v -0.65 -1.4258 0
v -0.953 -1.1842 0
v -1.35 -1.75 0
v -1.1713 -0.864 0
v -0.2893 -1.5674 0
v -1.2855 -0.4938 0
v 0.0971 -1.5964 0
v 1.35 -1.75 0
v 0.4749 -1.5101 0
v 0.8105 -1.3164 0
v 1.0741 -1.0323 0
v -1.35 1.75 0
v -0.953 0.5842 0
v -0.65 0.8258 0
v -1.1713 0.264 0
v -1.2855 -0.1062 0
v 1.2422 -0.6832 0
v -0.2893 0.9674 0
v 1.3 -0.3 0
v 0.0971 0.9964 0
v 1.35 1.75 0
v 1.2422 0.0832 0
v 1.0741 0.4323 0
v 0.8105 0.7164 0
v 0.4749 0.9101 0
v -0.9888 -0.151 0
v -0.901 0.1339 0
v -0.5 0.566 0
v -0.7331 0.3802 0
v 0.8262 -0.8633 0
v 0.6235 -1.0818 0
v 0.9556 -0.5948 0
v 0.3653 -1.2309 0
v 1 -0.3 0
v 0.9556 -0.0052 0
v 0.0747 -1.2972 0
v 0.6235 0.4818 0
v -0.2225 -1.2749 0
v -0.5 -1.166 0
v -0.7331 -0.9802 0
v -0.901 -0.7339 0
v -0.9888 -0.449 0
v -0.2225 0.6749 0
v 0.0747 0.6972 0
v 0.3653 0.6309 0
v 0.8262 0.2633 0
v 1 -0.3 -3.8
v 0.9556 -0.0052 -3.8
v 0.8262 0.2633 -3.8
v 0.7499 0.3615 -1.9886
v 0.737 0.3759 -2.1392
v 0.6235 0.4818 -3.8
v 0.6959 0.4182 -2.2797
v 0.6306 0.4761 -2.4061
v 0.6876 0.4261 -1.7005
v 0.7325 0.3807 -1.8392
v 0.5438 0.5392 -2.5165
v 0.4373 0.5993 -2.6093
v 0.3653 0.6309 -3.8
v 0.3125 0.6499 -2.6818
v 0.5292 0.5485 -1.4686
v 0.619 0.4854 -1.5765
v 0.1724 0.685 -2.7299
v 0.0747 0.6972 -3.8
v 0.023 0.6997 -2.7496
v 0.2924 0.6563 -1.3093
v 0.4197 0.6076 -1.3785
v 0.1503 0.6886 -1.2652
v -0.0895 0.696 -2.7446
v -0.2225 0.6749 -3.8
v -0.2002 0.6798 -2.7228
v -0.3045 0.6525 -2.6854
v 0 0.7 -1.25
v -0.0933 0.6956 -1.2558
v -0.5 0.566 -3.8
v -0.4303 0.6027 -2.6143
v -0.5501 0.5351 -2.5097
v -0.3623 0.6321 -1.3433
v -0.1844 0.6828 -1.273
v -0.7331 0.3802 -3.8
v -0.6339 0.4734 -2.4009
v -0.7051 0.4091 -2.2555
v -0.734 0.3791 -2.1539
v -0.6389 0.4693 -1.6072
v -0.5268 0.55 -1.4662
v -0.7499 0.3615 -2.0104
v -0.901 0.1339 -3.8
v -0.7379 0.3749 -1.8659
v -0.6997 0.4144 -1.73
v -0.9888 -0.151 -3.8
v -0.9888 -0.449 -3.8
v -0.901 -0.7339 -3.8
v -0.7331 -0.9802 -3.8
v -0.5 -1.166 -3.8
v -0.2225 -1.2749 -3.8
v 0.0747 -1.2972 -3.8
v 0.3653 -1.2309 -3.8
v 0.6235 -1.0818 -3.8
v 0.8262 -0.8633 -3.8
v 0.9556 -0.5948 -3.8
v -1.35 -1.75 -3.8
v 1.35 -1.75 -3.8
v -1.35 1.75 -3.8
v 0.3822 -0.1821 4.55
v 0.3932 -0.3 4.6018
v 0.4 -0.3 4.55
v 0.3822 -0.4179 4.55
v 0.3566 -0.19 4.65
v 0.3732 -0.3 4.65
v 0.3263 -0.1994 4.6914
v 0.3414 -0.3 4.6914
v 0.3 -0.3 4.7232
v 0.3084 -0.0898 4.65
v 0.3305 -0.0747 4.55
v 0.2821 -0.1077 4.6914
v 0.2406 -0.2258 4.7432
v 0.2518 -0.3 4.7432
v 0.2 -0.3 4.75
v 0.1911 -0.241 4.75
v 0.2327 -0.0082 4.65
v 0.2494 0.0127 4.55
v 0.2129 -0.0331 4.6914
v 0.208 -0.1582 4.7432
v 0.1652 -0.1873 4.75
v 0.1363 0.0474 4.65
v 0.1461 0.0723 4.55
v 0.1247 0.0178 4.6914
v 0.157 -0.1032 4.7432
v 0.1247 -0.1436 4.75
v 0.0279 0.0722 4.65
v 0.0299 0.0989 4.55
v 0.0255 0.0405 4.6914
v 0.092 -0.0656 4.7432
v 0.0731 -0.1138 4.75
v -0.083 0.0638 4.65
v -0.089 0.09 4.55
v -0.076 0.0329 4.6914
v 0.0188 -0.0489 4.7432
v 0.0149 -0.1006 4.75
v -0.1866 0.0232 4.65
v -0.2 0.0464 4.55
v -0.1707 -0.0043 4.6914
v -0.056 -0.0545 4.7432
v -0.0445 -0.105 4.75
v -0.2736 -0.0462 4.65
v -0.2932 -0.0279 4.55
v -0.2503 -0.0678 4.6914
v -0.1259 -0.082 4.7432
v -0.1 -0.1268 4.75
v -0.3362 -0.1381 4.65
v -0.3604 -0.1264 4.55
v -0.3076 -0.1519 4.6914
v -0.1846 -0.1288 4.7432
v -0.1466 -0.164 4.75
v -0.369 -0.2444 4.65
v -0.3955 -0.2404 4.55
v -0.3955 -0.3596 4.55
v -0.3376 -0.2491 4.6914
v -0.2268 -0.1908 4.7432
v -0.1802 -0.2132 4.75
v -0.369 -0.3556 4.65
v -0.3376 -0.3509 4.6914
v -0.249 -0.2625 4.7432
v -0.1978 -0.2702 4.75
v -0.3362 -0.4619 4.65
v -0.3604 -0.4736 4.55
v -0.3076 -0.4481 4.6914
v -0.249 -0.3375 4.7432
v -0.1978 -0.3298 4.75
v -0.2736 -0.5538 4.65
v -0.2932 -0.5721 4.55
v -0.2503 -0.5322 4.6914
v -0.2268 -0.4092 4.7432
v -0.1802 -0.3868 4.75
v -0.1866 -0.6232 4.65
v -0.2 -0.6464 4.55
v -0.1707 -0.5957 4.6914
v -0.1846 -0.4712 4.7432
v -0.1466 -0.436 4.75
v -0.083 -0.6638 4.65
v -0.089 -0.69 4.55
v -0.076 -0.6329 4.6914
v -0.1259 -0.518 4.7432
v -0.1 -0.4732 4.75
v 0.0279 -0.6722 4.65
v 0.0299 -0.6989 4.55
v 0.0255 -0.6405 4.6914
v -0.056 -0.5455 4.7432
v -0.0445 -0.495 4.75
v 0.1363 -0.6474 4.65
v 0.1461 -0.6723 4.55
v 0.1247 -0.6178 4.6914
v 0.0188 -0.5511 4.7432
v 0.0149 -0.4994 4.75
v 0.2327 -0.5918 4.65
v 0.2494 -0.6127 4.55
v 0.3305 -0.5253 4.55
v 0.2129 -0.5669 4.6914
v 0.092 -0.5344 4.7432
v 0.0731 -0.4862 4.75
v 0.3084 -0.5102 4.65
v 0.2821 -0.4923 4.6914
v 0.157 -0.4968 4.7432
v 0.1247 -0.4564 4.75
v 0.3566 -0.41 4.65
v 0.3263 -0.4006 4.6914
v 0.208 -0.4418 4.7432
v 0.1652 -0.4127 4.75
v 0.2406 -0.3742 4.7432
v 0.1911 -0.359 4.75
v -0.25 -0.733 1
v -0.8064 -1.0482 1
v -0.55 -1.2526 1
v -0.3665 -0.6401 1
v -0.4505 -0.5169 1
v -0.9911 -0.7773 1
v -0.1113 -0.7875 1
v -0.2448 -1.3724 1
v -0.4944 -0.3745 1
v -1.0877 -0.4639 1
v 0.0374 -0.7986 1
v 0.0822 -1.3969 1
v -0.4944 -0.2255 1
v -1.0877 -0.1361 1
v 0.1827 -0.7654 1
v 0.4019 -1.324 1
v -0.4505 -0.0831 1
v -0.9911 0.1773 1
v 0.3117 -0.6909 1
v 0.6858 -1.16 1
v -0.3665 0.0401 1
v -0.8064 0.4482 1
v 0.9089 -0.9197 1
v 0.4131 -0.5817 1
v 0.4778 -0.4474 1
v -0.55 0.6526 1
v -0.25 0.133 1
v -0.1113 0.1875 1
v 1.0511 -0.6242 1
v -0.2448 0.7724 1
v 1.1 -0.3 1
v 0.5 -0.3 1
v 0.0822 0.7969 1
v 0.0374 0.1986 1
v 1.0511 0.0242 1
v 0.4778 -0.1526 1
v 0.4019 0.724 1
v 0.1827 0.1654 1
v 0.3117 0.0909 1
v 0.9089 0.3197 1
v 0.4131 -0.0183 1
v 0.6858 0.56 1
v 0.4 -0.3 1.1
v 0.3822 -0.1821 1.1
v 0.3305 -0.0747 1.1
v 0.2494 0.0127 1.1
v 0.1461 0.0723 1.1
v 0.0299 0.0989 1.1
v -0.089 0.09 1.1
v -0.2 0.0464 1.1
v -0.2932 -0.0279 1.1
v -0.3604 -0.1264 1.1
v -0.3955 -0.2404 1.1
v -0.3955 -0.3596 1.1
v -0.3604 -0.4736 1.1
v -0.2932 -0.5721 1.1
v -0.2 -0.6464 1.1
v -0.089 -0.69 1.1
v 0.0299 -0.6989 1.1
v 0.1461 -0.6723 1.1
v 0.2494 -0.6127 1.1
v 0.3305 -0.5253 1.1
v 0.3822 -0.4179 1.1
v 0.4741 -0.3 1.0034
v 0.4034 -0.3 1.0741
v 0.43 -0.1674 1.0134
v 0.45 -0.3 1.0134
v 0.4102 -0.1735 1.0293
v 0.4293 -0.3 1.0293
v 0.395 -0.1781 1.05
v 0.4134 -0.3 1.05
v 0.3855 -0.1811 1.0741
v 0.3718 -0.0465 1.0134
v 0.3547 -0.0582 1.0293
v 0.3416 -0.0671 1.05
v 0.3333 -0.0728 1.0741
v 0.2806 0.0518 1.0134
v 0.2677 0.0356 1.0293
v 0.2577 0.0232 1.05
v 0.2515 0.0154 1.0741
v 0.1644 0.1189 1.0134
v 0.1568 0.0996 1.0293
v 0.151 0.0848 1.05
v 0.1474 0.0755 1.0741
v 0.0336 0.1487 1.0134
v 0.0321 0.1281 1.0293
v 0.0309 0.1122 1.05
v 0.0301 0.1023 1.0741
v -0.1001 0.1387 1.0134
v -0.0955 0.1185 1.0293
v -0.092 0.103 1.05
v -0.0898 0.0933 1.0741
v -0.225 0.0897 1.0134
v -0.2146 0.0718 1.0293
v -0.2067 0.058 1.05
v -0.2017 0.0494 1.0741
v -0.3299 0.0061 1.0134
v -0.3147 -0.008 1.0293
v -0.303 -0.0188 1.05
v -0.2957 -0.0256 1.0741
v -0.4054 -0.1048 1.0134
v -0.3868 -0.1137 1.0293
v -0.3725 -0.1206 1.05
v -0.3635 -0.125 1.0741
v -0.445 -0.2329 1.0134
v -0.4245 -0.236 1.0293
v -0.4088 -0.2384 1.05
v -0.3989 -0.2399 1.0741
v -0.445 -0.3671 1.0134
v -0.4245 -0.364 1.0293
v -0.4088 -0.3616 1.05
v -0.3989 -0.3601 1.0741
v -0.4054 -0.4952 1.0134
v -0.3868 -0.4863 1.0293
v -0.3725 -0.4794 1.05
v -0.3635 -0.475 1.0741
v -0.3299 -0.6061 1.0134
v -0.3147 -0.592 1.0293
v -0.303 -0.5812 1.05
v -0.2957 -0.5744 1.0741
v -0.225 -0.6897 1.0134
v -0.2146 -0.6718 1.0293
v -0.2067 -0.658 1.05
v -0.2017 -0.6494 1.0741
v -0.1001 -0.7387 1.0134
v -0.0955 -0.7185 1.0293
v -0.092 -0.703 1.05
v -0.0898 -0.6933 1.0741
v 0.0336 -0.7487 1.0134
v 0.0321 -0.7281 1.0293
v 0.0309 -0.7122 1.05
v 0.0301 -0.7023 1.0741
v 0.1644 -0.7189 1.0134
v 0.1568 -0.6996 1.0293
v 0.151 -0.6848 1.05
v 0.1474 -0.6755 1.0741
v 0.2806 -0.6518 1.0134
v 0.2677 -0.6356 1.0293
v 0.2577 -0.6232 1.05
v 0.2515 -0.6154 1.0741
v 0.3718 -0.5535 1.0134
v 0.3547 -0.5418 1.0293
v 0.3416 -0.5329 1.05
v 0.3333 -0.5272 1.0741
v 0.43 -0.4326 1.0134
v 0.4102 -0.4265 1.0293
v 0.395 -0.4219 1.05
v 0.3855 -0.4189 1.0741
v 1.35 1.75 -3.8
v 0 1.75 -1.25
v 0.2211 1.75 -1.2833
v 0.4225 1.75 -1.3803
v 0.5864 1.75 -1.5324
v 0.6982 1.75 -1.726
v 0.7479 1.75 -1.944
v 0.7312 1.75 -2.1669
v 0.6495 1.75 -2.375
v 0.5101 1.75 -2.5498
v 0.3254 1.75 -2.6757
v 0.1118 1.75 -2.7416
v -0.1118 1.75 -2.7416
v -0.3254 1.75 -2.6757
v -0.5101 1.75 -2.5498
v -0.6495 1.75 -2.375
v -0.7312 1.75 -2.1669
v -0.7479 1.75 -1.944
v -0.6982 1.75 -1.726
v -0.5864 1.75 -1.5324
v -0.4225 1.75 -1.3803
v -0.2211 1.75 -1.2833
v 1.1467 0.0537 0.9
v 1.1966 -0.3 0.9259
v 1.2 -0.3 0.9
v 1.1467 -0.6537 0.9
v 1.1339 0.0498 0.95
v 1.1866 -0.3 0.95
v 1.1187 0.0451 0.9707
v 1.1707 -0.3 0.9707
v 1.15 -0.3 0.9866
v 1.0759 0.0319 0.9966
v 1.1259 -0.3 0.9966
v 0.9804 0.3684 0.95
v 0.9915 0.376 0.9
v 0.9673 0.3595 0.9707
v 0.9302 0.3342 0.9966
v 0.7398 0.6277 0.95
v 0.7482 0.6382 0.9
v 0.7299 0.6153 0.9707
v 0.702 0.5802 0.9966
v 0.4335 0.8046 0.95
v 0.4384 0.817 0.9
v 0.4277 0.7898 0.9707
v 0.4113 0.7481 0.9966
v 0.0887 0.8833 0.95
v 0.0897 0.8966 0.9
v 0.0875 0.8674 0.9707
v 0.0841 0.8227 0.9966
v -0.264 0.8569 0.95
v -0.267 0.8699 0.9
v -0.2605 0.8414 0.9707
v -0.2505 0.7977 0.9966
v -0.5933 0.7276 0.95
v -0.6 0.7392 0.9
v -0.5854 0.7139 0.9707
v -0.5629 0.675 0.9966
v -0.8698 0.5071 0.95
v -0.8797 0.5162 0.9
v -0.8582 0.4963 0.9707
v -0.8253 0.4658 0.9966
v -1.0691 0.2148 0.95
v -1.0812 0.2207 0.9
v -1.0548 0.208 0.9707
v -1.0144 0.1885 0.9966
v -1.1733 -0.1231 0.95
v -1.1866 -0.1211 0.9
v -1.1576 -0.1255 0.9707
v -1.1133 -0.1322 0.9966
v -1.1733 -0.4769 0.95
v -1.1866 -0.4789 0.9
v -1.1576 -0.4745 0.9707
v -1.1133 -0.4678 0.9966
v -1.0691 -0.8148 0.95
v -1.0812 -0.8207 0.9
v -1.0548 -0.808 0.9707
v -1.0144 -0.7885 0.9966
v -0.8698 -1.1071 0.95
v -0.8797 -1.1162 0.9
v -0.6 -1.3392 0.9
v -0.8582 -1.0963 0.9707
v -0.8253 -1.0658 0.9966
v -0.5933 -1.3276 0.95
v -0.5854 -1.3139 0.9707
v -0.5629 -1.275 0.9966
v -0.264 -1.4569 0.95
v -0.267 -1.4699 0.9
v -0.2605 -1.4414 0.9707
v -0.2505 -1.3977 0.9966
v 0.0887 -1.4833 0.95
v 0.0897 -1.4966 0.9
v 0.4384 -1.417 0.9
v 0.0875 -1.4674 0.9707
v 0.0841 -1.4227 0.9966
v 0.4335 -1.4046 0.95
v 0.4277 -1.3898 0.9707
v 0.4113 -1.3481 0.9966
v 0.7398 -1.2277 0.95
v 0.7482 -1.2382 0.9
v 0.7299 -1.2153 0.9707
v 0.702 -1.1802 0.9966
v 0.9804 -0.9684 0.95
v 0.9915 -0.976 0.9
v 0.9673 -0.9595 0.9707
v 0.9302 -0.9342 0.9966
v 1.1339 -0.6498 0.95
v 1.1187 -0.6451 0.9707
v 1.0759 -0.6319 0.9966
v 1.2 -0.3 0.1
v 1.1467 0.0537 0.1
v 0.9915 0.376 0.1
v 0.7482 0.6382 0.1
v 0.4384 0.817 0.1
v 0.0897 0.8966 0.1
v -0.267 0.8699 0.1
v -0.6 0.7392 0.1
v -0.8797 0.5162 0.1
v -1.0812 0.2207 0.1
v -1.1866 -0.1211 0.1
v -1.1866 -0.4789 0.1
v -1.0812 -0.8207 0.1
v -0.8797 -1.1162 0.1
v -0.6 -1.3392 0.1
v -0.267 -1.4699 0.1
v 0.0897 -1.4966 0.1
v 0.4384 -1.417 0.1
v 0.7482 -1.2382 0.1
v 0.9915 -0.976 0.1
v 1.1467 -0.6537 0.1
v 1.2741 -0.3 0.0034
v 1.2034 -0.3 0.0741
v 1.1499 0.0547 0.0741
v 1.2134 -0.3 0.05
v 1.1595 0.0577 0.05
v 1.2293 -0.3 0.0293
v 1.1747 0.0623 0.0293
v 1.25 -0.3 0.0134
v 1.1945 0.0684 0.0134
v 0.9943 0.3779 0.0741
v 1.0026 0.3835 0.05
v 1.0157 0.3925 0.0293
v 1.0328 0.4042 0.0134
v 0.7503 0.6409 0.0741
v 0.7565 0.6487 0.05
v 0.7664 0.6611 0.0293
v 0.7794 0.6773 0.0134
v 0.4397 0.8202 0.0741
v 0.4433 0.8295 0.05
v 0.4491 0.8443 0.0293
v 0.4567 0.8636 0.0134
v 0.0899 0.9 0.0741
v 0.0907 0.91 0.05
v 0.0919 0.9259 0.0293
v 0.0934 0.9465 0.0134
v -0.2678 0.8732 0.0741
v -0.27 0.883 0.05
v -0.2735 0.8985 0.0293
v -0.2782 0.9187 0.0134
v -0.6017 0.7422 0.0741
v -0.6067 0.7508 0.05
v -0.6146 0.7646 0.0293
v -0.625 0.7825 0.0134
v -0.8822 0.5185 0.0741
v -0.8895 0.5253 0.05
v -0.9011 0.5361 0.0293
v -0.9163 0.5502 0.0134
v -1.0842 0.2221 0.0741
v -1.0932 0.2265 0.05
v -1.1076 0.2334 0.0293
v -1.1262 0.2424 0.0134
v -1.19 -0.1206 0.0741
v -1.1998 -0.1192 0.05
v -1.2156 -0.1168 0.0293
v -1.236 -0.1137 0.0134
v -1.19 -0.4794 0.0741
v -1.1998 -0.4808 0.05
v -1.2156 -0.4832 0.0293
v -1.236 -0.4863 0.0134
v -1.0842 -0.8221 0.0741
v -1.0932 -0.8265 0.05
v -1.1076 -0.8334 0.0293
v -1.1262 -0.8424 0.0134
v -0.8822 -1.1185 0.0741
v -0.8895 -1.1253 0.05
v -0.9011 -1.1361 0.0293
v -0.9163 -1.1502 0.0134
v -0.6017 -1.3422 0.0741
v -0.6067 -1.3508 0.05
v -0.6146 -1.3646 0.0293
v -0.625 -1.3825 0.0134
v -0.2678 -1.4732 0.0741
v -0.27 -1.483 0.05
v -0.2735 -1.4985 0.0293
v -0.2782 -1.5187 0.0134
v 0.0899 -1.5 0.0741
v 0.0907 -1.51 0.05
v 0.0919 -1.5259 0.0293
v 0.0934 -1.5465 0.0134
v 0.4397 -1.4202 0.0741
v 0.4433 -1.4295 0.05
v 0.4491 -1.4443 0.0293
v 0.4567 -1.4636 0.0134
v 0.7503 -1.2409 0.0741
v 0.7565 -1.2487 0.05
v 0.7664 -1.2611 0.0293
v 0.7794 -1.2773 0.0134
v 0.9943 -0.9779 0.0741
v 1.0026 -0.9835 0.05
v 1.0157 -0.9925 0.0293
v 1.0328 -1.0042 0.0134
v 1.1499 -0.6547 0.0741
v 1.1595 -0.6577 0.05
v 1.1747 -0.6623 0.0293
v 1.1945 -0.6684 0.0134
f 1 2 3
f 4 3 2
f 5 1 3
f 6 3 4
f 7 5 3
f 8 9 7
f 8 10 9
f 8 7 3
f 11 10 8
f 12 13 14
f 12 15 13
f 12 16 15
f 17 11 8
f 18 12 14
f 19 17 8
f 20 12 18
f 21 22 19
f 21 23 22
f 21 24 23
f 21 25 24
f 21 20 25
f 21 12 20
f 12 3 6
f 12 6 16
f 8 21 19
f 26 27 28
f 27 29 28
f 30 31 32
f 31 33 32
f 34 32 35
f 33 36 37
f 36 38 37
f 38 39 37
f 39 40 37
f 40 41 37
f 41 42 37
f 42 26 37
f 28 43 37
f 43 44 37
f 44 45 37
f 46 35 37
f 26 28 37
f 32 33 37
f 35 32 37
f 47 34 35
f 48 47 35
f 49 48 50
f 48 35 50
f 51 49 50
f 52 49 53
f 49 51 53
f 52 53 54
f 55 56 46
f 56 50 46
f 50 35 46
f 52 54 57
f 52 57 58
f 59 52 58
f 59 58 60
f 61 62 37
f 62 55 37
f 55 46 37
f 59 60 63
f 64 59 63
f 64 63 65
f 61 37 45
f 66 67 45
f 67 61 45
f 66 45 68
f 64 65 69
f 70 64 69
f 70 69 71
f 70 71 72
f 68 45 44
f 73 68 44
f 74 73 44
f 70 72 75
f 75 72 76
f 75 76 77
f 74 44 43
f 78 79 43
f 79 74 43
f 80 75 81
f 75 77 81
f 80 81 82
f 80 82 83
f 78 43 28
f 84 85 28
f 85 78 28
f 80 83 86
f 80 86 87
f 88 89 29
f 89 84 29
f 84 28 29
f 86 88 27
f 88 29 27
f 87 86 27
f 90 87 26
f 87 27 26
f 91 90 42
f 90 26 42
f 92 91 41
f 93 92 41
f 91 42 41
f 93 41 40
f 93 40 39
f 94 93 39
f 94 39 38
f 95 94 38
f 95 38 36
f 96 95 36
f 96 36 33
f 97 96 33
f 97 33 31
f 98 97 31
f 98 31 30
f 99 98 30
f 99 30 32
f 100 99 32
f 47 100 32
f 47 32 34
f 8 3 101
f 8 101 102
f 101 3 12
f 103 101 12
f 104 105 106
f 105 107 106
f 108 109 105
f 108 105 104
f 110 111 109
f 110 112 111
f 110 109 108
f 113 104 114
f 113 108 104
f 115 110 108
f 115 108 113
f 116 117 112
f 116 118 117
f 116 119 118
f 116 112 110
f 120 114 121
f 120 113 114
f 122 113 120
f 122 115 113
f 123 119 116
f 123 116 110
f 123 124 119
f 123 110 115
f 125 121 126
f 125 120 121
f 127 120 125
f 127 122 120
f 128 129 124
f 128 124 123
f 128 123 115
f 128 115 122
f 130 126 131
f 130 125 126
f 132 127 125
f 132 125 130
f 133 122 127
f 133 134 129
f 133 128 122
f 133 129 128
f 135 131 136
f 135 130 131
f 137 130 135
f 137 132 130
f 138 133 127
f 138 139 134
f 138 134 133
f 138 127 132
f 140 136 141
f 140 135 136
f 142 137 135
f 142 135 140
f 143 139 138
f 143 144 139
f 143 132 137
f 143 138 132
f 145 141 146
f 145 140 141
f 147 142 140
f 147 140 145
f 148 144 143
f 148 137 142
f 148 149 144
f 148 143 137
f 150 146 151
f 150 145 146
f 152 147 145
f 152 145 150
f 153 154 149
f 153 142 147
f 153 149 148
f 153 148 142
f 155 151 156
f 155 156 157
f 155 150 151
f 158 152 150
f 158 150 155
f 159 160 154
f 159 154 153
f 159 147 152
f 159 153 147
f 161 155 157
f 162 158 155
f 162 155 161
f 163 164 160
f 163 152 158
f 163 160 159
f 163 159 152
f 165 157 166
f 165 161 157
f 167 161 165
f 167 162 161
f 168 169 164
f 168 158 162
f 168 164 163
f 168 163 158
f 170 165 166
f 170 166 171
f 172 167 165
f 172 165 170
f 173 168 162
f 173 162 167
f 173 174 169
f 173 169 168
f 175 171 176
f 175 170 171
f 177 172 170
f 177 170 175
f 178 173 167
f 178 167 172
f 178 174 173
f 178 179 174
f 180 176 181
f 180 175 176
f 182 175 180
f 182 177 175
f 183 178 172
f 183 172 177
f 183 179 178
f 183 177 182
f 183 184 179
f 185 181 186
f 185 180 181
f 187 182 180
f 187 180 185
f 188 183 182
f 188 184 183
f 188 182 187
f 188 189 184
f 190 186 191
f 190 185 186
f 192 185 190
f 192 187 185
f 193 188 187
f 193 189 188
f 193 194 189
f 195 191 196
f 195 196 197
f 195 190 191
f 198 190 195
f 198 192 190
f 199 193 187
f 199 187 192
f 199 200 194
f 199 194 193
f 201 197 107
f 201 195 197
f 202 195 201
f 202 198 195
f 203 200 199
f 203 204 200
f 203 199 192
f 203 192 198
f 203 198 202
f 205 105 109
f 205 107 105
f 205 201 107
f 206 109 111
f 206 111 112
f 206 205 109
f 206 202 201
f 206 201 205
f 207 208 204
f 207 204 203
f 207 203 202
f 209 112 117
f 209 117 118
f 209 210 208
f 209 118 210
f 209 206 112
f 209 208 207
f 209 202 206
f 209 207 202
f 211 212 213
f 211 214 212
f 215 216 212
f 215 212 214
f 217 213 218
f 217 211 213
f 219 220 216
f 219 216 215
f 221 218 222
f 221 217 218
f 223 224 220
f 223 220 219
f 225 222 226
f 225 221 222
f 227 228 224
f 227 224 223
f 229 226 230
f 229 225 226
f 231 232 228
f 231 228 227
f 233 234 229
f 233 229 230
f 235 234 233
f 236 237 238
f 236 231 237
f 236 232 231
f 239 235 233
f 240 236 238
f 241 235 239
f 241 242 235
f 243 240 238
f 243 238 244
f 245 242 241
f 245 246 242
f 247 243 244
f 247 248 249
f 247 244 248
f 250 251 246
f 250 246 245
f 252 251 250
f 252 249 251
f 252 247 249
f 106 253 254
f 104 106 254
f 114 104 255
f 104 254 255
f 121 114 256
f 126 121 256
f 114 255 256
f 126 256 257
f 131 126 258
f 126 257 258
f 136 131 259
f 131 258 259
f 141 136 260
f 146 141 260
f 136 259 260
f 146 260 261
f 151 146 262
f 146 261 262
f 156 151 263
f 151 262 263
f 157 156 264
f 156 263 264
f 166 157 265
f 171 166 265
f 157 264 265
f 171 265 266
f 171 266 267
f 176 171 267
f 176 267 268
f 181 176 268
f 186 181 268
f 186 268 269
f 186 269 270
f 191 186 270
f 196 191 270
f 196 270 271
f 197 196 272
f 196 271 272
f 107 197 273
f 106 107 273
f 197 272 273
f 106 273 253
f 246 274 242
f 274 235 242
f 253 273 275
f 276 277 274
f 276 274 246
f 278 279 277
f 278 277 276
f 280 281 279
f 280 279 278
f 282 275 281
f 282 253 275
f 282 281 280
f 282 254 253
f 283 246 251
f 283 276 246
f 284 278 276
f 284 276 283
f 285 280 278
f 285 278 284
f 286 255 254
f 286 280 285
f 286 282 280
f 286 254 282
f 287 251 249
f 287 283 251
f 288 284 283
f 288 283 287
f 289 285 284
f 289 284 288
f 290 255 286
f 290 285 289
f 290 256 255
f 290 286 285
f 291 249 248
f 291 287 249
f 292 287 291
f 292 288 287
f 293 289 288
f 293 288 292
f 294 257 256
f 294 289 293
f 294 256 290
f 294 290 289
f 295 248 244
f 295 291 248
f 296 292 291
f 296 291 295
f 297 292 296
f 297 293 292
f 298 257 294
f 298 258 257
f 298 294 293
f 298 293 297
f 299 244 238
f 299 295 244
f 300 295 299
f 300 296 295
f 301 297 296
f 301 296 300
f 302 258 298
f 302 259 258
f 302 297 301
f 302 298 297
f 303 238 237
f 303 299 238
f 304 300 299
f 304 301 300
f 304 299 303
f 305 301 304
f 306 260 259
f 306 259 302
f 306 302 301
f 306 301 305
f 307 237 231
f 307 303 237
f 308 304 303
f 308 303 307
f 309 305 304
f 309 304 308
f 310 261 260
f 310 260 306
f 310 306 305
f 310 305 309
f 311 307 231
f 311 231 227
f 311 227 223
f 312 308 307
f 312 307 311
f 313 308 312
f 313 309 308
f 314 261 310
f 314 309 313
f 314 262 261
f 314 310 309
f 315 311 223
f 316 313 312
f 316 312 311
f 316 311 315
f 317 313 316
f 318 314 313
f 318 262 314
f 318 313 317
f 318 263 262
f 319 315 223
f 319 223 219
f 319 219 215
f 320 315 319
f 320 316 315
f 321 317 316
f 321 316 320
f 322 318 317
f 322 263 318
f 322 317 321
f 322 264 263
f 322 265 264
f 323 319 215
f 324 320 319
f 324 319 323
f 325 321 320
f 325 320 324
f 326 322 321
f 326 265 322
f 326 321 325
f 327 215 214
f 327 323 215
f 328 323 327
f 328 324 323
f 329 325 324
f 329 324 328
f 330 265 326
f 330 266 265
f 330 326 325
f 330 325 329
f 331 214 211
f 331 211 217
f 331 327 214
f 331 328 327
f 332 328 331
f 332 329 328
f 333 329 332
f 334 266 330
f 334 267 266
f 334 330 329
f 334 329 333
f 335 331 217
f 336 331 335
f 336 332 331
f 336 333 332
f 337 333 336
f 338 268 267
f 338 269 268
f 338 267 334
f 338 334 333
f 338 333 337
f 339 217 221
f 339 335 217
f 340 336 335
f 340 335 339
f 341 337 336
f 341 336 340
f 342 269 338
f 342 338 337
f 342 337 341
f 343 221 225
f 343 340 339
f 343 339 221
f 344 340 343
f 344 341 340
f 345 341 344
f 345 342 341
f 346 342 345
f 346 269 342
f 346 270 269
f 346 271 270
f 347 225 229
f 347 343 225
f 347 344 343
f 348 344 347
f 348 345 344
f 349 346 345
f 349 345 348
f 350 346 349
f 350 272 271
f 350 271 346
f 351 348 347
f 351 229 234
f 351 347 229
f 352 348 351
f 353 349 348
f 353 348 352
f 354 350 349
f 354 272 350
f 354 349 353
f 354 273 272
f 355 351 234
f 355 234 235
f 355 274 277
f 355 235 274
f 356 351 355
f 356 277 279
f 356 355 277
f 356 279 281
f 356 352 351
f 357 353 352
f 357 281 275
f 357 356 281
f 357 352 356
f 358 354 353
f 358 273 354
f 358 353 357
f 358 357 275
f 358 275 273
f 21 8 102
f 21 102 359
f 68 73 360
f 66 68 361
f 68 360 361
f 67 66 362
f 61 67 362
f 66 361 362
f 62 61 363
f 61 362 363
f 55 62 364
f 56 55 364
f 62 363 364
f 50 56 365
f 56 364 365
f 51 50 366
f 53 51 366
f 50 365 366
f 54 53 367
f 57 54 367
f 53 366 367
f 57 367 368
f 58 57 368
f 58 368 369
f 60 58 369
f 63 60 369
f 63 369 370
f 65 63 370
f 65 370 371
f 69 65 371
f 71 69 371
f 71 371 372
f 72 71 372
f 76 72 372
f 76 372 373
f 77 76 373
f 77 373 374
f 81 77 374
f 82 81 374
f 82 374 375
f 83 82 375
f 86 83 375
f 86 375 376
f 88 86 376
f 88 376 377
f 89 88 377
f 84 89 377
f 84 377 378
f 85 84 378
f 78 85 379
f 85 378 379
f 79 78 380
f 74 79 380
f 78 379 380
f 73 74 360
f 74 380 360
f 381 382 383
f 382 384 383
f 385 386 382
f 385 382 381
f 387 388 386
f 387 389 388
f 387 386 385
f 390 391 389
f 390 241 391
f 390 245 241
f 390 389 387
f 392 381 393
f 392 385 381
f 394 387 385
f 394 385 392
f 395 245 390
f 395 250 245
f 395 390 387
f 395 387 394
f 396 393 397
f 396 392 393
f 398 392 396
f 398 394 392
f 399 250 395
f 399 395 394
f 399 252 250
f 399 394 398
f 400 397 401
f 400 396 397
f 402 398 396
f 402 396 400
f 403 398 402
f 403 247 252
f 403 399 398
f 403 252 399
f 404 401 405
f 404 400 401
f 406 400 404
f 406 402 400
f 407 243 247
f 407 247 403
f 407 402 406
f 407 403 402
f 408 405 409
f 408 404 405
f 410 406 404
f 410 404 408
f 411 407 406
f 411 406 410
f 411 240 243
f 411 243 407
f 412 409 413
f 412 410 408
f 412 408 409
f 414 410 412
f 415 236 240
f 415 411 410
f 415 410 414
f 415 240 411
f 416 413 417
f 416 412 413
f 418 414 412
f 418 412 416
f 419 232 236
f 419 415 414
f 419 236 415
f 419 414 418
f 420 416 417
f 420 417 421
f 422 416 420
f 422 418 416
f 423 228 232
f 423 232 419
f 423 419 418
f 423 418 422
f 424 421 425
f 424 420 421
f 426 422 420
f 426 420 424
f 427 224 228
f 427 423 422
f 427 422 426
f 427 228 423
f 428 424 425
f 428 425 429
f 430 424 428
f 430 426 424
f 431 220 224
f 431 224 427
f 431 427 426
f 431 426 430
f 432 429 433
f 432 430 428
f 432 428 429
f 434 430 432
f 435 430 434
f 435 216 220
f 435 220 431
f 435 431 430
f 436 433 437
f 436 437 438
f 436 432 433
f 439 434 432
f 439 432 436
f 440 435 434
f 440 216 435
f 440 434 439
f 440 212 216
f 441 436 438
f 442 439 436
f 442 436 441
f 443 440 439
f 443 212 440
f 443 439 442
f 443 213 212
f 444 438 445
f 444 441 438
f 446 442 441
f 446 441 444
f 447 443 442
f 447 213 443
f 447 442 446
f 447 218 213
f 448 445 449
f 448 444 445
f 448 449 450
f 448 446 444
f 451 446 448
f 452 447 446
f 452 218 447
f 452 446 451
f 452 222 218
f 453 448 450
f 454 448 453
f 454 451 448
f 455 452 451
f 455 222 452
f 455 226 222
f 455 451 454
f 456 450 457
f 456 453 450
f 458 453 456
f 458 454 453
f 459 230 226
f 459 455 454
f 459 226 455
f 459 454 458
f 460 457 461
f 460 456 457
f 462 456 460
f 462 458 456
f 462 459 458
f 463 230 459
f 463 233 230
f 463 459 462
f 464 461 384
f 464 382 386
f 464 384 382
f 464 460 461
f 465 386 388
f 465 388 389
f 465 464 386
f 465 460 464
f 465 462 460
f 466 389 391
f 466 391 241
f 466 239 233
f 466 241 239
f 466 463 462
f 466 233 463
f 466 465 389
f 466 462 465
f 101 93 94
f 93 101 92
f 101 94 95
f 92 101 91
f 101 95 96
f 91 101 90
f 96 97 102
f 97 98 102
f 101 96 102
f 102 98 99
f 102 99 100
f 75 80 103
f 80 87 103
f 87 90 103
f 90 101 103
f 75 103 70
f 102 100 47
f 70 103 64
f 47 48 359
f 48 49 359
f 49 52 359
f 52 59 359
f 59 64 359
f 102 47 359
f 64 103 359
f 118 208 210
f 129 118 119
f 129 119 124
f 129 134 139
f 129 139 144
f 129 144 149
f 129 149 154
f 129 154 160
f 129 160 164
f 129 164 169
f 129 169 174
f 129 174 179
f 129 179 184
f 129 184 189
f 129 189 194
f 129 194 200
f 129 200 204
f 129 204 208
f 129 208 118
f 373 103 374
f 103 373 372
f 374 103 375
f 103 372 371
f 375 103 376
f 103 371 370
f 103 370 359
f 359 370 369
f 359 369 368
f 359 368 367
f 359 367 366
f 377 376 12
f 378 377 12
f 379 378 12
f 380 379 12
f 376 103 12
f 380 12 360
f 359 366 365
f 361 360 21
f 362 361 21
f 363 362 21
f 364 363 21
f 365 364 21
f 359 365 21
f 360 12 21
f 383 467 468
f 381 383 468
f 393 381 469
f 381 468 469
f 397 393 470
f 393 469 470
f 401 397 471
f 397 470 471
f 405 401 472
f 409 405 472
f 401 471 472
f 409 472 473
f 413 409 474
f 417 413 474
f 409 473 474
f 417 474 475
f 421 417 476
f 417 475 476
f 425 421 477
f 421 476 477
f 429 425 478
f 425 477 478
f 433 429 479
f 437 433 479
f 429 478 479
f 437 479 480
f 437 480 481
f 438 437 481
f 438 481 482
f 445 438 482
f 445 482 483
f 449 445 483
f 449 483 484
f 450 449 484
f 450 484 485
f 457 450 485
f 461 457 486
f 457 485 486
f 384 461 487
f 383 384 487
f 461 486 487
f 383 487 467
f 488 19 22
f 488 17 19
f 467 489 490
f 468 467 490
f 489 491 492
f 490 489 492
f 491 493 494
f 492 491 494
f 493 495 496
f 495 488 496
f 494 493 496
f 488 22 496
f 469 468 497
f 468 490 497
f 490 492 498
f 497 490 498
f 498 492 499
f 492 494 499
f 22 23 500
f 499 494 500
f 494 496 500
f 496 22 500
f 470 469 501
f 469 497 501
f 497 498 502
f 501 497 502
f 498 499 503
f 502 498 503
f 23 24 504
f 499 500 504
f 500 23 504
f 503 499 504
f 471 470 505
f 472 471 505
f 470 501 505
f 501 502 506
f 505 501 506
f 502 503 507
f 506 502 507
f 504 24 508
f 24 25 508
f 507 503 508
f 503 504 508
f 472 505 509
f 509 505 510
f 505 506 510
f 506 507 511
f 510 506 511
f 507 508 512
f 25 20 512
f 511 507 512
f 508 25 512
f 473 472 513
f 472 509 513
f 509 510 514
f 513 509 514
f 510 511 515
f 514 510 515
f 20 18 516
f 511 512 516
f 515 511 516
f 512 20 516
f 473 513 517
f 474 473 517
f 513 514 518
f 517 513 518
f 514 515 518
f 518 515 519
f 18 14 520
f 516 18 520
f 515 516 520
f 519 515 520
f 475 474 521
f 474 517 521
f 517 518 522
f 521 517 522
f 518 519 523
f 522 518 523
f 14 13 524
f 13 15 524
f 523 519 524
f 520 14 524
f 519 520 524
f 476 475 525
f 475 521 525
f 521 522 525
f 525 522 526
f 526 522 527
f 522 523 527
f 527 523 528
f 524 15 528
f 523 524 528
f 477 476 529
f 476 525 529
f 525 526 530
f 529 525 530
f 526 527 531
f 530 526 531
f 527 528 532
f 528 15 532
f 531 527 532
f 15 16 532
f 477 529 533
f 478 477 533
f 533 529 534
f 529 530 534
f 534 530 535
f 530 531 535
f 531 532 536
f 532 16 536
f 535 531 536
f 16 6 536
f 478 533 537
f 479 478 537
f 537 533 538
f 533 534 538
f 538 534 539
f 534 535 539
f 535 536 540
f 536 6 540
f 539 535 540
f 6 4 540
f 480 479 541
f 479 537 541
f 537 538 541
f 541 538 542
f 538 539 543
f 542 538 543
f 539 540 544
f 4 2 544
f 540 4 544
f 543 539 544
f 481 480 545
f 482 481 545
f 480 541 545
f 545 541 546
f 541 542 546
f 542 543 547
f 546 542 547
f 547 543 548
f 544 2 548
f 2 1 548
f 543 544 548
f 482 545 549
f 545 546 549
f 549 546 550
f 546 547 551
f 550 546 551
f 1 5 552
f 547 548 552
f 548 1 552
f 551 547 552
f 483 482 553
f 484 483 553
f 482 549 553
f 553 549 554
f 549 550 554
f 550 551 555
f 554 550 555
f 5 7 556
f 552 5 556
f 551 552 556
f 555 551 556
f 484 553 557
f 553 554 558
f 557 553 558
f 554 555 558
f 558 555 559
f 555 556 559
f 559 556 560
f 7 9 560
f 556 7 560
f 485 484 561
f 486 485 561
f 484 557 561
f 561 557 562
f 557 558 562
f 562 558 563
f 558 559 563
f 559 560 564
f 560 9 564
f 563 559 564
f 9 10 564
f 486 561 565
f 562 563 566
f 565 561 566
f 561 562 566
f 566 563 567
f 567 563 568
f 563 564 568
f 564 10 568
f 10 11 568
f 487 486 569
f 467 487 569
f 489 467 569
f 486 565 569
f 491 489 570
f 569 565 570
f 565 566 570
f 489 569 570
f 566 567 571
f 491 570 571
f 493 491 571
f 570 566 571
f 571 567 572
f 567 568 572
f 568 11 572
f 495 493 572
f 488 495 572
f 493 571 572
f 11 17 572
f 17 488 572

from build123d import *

# Parameters (mm, degrees)
SKETCH_1_W           = 2.7
SKETCH_1_H           = 3.5
EXTRUDE_1_DEPTH      = 3.8
SKETCH_2_OUTSIDE_W   = 5.866
SKETCH_2_OUTSIDE_H   = 6.666
SKETCH_2_OUTSIDE_W_2 = 2.7
SKETCH_2_OUTSIDE_H_2 = 3.5
SKETCH_2_OUTSIDE_R   = 1
CUT_EXTRUDE_1_DEPTH  = 5.396020928
SKETCH_4_OUTSIDE_W   = 5.866
SKETCH_4_OUTSIDE_H   = 6.966
SKETCH_4_OUTSIDE_W_2 = 2.7
SKETCH_4_OUTSIDE_H_2 = 3.8
SKETCH_4_OUTSIDE_R   = 0.75
CUT_EXTRUDE_2_DEPTH  = 1.85
SKETCH_7_R           = 1.2
EXTRUDE_3_DEPTH      = 1
SKETCH_8_R           = 0.4
EXTRUDE_4_DEPTH      = 3.75
FILLET_1_R           = 0.1
FILLET_2_R           = 0.1
FILLET_3_R           = 0.1
FILLET_4_R           = 0.2


with BuildPart() as part:
    # Эскиз1 → Бобышка-Вытянуть1 (new body)
    with BuildSketch(Plane.XY):
        Rectangle(SKETCH_1_W, SKETCH_1_H)
    extrude(amount=-EXTRUDE_1_DEPTH)

    # Эскиз2 outside → Вырез-Вытянуть1 (cut, through all)
    # profile 1 of 2: a face of its own
    with BuildSketch(Plane.XY):
        Rectangle(SKETCH_2_OUTSIDE_W, SKETCH_2_OUTSIDE_H)
        Rectangle(SKETCH_2_OUTSIDE_W_2, SKETCH_2_OUTSIDE_H_2, mode=Mode.SUBTRACT)
    # profile 2 of 2: a face of its own
    with BuildSketch(Plane.XY):
        with Locations((0, -0.3)):
            Circle(SKETCH_2_OUTSIDE_R)
    extrude(amount=-CUT_EXTRUDE_1_DEPTH, mode=Mode.SUBTRACT)

    # Эскиз4 outside → Вырез-Вытянуть2 (cut)
    # profile 1 of 2: a face of its own
    with BuildSketch(Plane(origin=(0, 1.75, 0), x_dir=(1, 0, 0), z_dir=(0, 1, 0))):
        with Locations((0, 1.9)):
            Rectangle(SKETCH_4_OUTSIDE_W, SKETCH_4_OUTSIDE_H)
        with Locations((0, 1.9)):
            Rectangle(SKETCH_4_OUTSIDE_W_2, SKETCH_4_OUTSIDE_H_2, mode=Mode.SUBTRACT)
    # profile 2 of 2: a face of its own
    with BuildSketch(Plane(origin=(0, 1.75, 0), x_dir=(1, 0, 0), z_dir=(0, 1, 0))):
        with Locations(Location((0, 2, 0), (0, 0, 270))):
            Circle(SKETCH_4_OUTSIDE_R)
    extrude(amount=-CUT_EXTRUDE_2_DEPTH, mode=Mode.SUBTRACT)

    # Эскиз7 → Бобышка-Вытянуть3 (add)
    with BuildSketch(Plane.XY):
        with Locations((0, -0.3)):
            Circle(SKETCH_7_R)
    extrude(amount=EXTRUDE_3_DEPTH)

    # Эскиз8 → Бобышка-Вытянуть4 (add)
    with BuildSketch(Plane.XY.offset(1)):
        with Locations((0, -0.3)):
            Circle(SKETCH_8_R)
    extrude(amount=EXTRUDE_4_DEPTH)

    # Скругление1
    fillet_1_edges = [part.edges().sort_by_distance(p)[0] for p in [
        (-1.2, -0.3, 1),
    ]]
    fillet(fillet_1_edges, radius=FILLET_1_R)

    # Скругление2
    fillet_2_edges = [part.edges().sort_by_distance(p)[0] for p in [
        (-1.2, -0.3, 0),
    ]]
    fillet(fillet_2_edges, radius=FILLET_2_R)

    # Скругление3
    fillet_3_edges = [part.edges().sort_by_distance(p)[0] for p in [
        (-0.4, -0.3, 1),
    ]]
    fillet(fillet_3_edges, radius=FILLET_3_R)

    # Скругление4
    fillet_4_edges = [part.edges().sort_by_distance(p)[0] for p in [
        (-0.4, -0.3, 4.75),
    ]]
    fillet(fillet_4_edges, radius=FILLET_4_R)


solid = part.part
